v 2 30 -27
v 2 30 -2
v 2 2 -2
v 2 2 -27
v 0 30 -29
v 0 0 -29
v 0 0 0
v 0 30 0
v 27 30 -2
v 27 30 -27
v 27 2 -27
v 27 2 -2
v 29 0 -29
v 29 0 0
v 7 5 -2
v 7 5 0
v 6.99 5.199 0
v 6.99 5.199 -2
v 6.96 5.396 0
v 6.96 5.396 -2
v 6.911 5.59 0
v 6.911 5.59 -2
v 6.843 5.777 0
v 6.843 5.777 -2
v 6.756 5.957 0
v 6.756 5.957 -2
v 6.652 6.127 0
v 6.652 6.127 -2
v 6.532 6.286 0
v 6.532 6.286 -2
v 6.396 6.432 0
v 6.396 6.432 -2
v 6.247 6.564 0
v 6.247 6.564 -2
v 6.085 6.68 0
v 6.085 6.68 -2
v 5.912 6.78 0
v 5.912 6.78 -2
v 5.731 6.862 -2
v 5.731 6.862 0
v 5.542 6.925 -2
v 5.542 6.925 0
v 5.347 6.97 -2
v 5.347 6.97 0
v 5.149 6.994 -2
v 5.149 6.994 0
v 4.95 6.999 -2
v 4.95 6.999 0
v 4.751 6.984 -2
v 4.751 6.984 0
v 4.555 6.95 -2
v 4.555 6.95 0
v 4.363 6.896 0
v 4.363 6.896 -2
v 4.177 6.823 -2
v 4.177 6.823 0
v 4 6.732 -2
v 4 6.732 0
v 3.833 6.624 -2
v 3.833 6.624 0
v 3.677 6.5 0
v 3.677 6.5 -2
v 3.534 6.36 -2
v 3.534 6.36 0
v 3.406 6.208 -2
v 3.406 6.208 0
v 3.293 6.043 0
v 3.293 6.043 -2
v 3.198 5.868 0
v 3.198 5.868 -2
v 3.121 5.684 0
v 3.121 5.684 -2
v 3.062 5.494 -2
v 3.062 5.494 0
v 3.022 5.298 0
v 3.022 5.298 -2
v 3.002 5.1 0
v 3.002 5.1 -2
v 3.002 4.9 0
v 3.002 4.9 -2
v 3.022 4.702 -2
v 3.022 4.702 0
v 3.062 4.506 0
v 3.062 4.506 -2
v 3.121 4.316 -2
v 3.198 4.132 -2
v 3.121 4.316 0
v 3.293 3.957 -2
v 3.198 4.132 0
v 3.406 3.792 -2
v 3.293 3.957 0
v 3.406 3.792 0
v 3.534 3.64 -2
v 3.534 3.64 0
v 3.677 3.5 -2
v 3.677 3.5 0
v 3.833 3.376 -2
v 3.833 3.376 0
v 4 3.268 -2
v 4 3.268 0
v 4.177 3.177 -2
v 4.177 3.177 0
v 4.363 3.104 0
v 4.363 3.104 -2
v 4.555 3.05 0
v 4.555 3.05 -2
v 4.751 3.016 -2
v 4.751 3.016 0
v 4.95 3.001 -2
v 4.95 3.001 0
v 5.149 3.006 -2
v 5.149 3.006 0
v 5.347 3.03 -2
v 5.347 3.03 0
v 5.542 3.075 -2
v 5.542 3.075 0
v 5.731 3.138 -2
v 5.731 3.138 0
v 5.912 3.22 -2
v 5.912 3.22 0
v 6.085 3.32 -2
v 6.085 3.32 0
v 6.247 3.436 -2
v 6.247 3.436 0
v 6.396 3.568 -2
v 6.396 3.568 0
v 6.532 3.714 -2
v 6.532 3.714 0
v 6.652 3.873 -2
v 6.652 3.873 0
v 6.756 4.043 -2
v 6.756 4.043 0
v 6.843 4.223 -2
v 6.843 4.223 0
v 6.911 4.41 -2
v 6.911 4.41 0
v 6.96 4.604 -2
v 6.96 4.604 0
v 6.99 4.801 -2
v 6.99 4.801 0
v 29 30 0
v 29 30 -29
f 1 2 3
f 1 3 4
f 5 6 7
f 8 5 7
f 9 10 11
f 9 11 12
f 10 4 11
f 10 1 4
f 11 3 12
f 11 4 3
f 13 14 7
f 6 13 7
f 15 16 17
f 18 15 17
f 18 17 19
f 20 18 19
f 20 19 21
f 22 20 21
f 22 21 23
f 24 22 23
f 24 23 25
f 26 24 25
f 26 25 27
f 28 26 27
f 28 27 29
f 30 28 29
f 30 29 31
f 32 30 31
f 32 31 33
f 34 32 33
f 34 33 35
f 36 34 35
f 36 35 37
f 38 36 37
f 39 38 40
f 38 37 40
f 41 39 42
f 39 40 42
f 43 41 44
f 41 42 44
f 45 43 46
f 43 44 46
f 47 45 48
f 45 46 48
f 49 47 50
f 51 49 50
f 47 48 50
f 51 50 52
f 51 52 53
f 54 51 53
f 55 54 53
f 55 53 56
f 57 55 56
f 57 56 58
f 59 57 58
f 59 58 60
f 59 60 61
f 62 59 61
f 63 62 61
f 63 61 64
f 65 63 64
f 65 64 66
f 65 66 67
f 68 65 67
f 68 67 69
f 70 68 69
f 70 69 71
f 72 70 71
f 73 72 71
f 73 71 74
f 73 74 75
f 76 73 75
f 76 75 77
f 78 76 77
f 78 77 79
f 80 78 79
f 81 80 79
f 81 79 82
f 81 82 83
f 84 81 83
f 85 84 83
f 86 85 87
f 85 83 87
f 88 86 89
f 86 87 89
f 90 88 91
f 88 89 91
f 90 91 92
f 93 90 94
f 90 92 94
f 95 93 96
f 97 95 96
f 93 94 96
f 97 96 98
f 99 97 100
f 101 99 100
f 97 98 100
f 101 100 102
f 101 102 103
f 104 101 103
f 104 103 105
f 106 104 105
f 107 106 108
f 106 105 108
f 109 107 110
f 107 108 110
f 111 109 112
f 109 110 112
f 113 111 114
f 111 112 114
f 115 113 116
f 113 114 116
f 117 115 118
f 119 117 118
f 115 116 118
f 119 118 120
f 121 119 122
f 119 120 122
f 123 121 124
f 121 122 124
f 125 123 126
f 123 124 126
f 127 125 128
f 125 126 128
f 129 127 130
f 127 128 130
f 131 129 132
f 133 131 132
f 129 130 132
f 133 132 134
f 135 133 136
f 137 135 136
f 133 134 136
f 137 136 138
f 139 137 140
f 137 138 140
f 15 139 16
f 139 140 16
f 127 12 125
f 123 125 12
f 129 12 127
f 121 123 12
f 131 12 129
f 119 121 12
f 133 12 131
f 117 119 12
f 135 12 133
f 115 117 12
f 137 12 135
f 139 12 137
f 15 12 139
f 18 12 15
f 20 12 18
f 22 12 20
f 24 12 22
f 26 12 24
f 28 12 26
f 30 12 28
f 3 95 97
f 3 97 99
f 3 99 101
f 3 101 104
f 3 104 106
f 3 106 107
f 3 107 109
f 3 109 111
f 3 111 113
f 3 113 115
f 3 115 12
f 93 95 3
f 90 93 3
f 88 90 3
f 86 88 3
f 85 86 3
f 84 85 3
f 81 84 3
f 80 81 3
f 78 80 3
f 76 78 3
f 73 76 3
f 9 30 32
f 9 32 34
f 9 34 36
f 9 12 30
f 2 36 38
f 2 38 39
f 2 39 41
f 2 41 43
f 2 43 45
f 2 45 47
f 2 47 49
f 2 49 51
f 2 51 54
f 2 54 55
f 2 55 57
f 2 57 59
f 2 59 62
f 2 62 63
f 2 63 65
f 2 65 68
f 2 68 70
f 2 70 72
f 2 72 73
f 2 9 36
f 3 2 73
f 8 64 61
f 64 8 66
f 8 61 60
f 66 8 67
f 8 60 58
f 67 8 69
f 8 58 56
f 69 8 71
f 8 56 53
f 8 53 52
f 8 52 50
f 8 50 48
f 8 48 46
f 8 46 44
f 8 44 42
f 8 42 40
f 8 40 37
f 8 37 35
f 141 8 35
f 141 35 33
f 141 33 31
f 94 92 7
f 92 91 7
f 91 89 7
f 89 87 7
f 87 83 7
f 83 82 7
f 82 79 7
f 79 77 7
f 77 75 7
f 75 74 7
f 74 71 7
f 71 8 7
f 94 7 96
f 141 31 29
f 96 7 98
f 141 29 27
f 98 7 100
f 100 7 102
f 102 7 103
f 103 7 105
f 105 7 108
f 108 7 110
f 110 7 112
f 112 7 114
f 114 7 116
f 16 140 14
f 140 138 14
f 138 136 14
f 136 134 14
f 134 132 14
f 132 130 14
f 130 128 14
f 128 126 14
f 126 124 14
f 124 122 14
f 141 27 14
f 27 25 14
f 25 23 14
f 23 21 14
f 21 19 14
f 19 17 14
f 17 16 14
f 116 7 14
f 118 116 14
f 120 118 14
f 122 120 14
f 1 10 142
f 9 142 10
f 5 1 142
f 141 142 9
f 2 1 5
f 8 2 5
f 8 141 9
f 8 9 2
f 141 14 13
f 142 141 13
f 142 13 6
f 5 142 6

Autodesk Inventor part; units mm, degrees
ref_plane "YZ Plane" through (0, 0, 0) normal (1, 0, 0) x (0, 1, 0)
ref_plane "XZ Plane" through (0, 0, 0) normal (0, 1, 0) x (-1, 0, 0)
ref_plane "XY Plane" through (0, 0, 0) normal (0, 0, 1) x (1, 0, 0)
sketch "Sketch7" plane through (0, 0, 0) normal (0, 1, 0) x (-1, 0, 0)
  point P0 (0, 0)
sketch "Sketch8" plane through (0, 0, 0) normal (0, 1, 0) x (-1, 0, 0)
  line L0 (0, 0) -> (-29, 0)
  line L1 (-29, 0) -> (-29, -29)
  line L2 (-29, -29) -> (0, -29)
  line L3 (0, -29) -> (0, 0)
  line L4 (-2, -27) -> (-27, -27)
  line L5 (-27, -27) -> (-27, -2)
  line L6 (-27, -2) -> (-2, -2)
  line L7 (-2, -2) -> (-2, -27)
  dimension "d25" = 29
  dimension "d26" = 29
  dimension "d38" = 2
extrude "Extrusion5" add sketch "Sketch8" along normal blind 30 contours L3 L2 L1 L0 | L4 L5 L6 L7
sketch "Sketch11" plane through (0, 30, 0) normal (0, 1, 0) x (1, 0, 0)
  line L0 (0, 0) -> (29, 0) projected
  line L1 (29, 0) -> (29, 29) projected
  line L2 (29, 29) -> (0, 29) projected
  line L3 (0, 29) -> (0, 0) projected
  line L4 (2, 27) -> (27, 27)
  line L5 (27, 27) -> (27, 2)
  line L6 (27, 2) -> (2, 2)
  line L7 (2, 2) -> (2, 27)
  dimension "d39" = 2
extrude "Extrusion8" cut sketch "Sketch11" against normal blind 28 contours L4 L5 L6 L7
sketch "Sketch12" plane through (0, 0, 0) normal (0, 0, 1) x (1, 0, 0)
  line L0 (2, 30) -> (27, 30) projected
  line L1 (2, 30) -> (2, 2) projected
  line L2 (27, 30) -> (27, 2) projected
  line L3 (2, 2) -> (5, 2)
  line L4 (5, 2) -> (5, 5)
  line L5 (5, 5) -> (2, 5)
  line L6 (2, 5) -> (2, 2)
  circle A0 centre (5, 5) radius 2
  line L7 (2, 2) -> (27, 2) projected
  point P0 (0, 0)
  dimension "d42" = 3
  dimension "d43" = 3
  dimension "d44" = 4
extrude "Extrusion9" cut sketch "Sketch12" against normal blind 2 contours A0 L4 L5 | L5 L4 A0
equation "\"BendRadius\" = Thickness"
equation "\"BendReliefWidth\" = Thickness"
equation "\"BendReliefDepth\" = 0.5 * Thickness"
equation "\"CornerReliefSize\" = 4 * Thickness"
equation "\"MinimumRemnant\" = 2 * Thickness"
equation "\"TransitionRadius\" = BendRadius"
equation "\"JacobiRadiusSize\" = Thickness"
equation "\"GapSize\" = Thickness"
equation "\"Thickness\" = 0.5"
properties part number "waterBallonHolderv2"
